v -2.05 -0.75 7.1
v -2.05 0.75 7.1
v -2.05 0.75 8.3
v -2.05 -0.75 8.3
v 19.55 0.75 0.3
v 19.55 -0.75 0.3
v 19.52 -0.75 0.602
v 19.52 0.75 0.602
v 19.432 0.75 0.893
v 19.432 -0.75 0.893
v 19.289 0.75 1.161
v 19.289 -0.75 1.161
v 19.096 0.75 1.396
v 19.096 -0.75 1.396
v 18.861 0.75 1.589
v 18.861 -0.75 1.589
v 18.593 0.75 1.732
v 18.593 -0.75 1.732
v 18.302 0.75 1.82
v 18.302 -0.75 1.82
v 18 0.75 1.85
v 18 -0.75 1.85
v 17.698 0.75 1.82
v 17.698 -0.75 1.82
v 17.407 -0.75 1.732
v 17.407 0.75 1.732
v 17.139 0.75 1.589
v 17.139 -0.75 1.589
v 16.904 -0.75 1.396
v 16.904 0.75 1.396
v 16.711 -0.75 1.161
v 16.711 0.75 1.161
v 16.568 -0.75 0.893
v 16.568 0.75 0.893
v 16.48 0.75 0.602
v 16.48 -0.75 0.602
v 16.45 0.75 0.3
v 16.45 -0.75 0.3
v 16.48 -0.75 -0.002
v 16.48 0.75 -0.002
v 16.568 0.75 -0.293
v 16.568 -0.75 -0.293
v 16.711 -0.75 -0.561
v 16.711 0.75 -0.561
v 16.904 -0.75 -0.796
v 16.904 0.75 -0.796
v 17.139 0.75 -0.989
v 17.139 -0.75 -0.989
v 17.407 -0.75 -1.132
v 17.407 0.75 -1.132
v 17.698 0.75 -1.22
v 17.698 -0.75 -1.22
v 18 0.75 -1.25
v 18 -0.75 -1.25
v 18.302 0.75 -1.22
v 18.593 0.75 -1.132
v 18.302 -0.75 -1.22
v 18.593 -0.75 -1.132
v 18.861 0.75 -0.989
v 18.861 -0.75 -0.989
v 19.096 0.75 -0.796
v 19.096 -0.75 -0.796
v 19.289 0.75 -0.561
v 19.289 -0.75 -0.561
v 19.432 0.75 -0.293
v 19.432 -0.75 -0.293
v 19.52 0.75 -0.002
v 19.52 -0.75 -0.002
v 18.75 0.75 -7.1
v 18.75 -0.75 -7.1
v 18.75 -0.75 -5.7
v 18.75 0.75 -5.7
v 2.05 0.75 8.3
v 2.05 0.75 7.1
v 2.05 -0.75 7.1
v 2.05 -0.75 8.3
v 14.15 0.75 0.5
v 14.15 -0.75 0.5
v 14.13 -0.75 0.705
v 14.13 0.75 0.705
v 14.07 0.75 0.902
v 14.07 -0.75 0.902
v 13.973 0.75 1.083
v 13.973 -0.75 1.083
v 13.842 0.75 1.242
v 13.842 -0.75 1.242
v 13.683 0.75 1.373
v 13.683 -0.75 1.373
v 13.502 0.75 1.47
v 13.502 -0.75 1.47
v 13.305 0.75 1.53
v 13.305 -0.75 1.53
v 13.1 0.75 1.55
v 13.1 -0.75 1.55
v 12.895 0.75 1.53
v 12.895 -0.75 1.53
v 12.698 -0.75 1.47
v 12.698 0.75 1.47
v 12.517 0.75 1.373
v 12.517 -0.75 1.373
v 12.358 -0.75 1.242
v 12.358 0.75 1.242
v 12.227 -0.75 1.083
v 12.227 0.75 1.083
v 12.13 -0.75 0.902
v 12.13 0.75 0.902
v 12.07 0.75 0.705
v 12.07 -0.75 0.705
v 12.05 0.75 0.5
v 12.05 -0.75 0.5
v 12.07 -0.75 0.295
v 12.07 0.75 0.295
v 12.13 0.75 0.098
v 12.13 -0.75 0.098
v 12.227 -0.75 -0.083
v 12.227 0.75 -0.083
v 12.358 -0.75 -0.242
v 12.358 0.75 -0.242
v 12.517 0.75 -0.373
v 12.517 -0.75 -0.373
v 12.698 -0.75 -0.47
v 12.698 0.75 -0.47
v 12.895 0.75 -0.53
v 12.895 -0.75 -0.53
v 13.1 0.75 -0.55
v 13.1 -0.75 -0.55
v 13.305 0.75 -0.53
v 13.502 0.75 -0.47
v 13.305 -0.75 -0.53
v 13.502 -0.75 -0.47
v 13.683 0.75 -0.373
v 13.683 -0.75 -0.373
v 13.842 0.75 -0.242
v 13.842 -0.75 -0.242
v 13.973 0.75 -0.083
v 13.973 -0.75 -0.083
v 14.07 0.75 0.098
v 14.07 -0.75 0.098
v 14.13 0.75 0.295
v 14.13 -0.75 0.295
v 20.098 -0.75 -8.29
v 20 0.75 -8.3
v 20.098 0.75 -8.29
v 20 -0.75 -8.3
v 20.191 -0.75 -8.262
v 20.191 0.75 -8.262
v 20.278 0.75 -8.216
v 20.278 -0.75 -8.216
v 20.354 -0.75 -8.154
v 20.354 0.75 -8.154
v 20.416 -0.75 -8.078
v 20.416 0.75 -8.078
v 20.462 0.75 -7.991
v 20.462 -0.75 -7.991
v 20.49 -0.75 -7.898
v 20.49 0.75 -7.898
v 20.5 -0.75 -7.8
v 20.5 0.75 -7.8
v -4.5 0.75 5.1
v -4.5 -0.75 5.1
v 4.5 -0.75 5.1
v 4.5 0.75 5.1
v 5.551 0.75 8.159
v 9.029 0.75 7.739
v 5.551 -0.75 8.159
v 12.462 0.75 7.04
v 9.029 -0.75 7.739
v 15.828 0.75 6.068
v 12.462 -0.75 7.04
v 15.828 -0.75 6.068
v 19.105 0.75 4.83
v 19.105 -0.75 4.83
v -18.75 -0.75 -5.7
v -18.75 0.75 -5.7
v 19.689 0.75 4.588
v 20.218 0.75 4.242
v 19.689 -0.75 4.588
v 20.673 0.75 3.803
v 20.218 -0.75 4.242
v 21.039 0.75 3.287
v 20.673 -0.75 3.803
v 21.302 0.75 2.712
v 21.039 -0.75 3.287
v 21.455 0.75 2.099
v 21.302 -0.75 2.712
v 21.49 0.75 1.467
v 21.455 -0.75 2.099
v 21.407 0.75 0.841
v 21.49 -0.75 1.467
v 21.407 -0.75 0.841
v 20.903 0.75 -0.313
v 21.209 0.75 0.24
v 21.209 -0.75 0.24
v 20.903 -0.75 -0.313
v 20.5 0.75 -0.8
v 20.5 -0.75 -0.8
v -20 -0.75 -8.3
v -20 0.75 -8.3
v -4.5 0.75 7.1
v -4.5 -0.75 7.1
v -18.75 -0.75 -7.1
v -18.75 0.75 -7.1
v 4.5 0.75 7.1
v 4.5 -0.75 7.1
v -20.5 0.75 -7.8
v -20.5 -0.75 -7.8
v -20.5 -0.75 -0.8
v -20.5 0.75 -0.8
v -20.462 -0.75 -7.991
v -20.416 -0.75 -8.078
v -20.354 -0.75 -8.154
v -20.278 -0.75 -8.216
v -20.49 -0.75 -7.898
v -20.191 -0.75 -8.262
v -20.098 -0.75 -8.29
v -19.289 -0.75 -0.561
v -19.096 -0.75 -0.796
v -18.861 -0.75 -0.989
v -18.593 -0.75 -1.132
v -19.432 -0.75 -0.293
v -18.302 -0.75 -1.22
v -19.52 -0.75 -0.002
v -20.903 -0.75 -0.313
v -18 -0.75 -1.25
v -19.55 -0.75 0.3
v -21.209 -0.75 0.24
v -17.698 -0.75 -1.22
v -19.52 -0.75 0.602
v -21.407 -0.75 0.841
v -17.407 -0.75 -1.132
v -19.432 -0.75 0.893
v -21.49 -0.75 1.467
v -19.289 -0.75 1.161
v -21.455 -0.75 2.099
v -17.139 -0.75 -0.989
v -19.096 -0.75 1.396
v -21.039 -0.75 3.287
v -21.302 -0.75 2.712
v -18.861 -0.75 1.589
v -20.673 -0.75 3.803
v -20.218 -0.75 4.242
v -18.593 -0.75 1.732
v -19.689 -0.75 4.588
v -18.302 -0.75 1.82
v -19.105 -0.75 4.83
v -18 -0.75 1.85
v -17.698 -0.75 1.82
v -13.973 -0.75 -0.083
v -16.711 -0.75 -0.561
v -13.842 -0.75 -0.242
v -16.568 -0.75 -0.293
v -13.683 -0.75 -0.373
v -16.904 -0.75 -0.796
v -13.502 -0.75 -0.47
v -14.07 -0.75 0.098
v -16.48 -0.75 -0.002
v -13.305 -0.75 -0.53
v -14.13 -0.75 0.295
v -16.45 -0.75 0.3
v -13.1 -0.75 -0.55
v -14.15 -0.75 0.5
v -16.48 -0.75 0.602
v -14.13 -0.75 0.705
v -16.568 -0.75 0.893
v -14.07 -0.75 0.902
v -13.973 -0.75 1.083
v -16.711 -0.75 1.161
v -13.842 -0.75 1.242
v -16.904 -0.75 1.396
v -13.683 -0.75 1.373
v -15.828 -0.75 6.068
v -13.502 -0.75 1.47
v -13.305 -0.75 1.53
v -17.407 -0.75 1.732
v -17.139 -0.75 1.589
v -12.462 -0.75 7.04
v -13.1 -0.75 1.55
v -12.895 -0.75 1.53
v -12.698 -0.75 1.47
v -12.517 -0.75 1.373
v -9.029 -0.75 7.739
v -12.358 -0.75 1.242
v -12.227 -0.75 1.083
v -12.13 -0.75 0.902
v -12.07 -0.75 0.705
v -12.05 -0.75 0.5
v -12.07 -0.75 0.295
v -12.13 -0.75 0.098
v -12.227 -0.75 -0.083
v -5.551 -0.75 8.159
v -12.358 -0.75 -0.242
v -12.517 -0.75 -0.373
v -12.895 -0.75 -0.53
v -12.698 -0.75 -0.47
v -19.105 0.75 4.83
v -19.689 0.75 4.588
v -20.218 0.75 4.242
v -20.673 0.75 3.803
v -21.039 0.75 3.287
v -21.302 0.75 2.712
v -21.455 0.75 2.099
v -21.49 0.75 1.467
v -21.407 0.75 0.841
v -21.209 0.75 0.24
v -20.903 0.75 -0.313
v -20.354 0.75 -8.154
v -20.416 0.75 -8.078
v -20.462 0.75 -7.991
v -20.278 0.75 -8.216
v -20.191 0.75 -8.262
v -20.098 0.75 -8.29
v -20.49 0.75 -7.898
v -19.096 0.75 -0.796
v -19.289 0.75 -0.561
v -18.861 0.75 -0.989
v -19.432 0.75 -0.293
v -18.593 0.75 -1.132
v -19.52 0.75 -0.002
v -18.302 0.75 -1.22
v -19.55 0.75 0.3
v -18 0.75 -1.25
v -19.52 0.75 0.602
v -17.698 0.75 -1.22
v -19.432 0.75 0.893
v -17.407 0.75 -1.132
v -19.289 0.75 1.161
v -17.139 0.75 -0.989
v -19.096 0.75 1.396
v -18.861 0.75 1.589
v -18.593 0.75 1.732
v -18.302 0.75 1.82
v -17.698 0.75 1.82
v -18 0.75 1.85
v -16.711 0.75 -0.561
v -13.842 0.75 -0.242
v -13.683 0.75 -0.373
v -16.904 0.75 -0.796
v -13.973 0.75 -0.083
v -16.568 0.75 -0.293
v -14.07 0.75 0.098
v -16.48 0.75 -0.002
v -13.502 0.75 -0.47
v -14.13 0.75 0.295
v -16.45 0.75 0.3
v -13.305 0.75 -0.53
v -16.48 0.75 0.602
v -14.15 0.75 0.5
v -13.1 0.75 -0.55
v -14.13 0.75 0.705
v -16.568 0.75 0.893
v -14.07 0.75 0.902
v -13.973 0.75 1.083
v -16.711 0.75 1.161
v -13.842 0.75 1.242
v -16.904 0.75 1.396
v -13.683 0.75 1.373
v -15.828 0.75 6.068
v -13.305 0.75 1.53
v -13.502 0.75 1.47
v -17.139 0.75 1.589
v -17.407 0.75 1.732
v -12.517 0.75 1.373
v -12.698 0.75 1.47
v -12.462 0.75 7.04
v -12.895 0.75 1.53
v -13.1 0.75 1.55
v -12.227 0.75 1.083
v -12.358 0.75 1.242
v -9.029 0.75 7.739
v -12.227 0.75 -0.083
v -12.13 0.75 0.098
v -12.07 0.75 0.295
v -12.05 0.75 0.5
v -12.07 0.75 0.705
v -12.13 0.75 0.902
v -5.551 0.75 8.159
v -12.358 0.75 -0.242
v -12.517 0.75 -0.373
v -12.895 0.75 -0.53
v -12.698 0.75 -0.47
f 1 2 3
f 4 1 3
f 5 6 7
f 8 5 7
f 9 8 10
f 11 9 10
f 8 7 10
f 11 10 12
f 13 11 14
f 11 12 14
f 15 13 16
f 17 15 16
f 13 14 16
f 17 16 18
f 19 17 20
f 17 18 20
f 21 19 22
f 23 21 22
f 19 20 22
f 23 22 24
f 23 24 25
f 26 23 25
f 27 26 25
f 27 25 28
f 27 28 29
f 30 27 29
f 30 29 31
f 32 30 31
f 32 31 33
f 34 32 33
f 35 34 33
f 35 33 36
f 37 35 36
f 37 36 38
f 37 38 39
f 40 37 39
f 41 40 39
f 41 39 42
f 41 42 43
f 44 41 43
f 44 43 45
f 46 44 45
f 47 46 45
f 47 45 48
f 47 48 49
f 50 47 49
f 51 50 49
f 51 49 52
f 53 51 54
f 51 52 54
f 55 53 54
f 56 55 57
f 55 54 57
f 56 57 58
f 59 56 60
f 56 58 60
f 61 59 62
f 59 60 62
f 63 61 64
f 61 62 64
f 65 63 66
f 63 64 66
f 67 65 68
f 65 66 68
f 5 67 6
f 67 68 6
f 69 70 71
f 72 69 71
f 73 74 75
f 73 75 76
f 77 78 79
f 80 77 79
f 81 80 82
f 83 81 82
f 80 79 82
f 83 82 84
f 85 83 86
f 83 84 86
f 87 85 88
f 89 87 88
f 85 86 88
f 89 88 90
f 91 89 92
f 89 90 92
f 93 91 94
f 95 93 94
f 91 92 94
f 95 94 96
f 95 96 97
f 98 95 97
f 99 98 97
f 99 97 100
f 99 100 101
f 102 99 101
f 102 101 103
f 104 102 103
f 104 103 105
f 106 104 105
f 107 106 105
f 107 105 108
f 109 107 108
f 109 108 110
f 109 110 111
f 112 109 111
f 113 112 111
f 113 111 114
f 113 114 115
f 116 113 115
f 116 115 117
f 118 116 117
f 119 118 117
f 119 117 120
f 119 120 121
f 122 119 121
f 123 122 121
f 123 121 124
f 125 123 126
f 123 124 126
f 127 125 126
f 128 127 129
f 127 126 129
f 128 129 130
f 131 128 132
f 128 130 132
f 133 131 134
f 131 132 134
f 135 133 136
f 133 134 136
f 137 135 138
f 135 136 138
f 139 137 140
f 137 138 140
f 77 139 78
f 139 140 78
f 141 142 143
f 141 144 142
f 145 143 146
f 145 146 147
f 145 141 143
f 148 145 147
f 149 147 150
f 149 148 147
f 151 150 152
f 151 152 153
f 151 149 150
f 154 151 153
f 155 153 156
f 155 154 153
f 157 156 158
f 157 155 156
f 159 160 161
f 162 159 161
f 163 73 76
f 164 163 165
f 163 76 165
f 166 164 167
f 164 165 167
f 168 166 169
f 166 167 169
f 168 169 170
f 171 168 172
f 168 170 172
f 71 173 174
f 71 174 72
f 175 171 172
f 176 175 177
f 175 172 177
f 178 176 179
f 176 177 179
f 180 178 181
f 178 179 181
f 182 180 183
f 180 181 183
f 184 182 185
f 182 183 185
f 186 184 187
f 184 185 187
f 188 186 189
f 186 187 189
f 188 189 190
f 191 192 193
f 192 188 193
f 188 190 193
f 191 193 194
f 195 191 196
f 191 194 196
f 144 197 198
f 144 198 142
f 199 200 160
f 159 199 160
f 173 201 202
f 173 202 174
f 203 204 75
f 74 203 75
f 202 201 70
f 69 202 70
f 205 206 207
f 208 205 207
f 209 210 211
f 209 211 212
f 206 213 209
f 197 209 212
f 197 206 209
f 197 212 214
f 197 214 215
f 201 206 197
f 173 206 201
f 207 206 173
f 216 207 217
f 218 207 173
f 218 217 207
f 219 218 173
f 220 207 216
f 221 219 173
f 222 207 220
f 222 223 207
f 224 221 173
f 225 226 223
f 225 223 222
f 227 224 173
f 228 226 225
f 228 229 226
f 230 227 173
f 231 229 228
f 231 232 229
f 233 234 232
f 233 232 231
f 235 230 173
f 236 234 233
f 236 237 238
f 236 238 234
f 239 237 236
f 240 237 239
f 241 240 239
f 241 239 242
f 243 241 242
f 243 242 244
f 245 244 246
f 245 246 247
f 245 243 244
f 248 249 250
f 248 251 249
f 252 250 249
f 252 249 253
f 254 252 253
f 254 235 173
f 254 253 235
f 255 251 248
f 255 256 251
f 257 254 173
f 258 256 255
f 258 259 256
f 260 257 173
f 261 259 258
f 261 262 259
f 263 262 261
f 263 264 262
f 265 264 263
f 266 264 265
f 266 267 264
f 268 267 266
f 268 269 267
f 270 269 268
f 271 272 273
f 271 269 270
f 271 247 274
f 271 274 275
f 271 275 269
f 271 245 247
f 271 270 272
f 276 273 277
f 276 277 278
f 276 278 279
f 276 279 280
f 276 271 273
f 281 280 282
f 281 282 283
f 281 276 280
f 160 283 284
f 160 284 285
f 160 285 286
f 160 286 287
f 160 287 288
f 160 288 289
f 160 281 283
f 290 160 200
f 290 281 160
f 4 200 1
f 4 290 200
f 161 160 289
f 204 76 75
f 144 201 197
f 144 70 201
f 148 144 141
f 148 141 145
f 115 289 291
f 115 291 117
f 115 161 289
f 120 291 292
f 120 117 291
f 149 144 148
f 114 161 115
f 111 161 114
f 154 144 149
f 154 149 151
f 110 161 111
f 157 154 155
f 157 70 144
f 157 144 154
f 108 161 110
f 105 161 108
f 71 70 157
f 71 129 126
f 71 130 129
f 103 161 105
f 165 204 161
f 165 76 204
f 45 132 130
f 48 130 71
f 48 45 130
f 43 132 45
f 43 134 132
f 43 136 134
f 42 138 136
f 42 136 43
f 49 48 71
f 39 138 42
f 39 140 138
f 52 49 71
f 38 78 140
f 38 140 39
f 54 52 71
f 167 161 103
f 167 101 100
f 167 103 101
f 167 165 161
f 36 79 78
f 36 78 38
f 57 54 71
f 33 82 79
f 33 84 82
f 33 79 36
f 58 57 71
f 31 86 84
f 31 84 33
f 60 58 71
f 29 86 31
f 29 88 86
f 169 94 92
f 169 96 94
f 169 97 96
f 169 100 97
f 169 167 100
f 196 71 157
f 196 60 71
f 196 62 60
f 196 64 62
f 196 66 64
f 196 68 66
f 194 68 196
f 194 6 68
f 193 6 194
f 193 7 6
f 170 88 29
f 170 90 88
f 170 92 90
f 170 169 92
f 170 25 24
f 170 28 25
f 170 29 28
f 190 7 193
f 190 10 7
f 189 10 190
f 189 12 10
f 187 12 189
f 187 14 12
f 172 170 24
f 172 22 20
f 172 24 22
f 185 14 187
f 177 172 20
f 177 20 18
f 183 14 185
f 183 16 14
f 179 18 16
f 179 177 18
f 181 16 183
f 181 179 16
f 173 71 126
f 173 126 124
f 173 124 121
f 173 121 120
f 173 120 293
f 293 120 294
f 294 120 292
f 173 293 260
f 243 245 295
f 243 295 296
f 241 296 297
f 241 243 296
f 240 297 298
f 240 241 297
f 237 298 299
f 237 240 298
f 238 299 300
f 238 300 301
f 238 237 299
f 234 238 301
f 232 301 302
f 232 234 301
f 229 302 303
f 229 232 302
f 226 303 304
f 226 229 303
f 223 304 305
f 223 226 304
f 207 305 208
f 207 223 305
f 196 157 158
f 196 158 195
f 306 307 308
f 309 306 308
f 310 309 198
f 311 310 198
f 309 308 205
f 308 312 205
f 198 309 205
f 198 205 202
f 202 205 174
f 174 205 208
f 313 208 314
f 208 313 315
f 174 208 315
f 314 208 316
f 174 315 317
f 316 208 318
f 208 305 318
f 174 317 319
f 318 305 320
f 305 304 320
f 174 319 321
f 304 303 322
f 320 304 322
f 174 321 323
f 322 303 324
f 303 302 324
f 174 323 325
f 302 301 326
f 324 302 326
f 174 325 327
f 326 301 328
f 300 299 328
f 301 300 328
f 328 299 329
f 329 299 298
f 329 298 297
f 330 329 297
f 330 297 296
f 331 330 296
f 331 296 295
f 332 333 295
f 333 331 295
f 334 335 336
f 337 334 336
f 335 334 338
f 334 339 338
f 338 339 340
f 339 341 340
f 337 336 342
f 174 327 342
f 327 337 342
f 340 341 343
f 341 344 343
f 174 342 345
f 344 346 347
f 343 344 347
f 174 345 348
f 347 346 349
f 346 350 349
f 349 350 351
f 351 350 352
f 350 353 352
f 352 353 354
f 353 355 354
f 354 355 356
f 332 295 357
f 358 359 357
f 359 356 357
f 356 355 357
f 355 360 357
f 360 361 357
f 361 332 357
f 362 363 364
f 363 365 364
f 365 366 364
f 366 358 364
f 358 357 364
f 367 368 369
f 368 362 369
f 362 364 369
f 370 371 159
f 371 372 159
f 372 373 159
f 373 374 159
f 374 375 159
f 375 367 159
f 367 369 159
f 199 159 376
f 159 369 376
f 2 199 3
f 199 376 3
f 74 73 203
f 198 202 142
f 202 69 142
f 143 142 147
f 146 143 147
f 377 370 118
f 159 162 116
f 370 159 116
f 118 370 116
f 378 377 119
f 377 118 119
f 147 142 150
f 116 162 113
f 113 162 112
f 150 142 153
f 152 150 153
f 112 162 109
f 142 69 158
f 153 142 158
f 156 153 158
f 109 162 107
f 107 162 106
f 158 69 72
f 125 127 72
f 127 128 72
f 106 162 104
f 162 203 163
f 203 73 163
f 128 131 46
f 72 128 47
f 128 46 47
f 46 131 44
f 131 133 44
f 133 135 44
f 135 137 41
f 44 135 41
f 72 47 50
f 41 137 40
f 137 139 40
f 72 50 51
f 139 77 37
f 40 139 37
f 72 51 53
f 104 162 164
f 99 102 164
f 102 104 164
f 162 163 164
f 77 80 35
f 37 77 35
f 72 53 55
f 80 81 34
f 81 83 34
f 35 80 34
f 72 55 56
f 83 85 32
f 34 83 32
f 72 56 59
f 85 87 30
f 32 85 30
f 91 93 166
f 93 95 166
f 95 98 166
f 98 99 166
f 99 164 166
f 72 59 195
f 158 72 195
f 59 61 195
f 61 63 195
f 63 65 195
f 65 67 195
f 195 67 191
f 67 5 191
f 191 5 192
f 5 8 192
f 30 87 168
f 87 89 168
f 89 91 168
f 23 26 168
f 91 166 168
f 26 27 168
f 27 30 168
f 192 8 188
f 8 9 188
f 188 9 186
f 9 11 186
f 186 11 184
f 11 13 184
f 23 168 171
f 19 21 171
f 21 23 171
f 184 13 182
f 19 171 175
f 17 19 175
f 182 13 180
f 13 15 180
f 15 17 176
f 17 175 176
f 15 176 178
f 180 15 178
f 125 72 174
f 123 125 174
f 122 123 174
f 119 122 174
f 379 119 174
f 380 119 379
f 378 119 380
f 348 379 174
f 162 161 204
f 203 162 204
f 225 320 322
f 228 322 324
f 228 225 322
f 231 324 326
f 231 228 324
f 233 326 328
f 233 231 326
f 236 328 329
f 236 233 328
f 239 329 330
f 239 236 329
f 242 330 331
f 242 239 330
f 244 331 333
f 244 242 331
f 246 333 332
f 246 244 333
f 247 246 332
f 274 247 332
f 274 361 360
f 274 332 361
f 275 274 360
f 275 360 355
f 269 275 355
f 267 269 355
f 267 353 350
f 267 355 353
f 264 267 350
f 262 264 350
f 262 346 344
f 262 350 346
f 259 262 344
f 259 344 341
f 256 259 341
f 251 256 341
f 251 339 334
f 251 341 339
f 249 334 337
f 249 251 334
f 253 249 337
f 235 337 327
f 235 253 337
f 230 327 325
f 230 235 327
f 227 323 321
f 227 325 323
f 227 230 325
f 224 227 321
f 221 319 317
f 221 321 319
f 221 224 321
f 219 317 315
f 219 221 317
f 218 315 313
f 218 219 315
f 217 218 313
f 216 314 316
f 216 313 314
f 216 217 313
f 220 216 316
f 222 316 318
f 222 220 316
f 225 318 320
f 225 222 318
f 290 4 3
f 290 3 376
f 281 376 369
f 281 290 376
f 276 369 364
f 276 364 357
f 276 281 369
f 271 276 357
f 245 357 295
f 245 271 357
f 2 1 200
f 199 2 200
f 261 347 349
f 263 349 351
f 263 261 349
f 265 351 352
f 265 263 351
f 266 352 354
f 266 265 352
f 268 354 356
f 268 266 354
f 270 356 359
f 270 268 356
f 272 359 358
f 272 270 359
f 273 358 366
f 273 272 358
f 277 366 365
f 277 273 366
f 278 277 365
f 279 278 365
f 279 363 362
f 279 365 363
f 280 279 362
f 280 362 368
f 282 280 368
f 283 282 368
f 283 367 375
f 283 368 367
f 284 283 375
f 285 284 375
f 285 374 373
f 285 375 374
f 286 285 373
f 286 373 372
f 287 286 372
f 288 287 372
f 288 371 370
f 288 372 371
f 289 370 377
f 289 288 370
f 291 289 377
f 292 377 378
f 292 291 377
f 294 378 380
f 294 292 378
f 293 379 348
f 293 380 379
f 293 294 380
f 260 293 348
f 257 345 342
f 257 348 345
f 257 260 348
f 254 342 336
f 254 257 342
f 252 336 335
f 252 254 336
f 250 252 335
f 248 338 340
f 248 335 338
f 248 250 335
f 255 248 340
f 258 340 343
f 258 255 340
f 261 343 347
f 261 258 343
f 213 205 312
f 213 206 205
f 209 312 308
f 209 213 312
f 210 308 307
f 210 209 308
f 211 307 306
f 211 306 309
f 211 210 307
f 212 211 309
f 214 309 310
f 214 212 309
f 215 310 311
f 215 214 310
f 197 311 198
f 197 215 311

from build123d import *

# Parameters (mm, degrees)
F0_W      = 43
F0_H      = 16.6
F1_DEPTH  = 0.75
F2_W      = 37.5
F2_H      = 1.4
F3_DEPTH  = 75
F5_R      = 1.05
F5_R_2    = 1.55
F6_DEPTH  = 1.501
F7_W      = 4.1
F7_H      = 1.9489285067
F7_H_2    = 0.8016004696
F7_W_2    = 2
F7_H_3    = 15
F8_DEPTH  = 1.501
F10_DEPTH = 1.501
F11_R     = 0.5


# Not quite as in the source:
# - a feature of the source that left no trace in its solid (it failed there, or was rolled back) is left out
# - a pattern or mirror of a feature is missing from the dataset's text; its kind, count and spacing are read off the source's solid


with BuildPart() as f1:
    # F0 (on Front) → F1 (new body, symmetric)
    with BuildSketch(Plane.XZ):
        Rectangle(F0_W, F0_H)
    extrude(amount=F1_DEPTH, both=True)

    # F2 (on Front) → F3 (cut, symmetric)
    with BuildSketch(Plane.XZ):
        with Locations((0, -6.4)):
            Rectangle(F2_W, F2_H)
    extrude(amount=F3_DEPTH, both=True, mode=Mode.SUBTRACT)

    # F5 (on face) → F6 (cut, through all)
    with BuildSketch(Plane.XZ.offset(0.75)):
        with Locations((13.1, 0.5)):
            Circle(F5_R)
        with Locations((18, 0.3)):
            Circle(F5_R_2)
    f6 = extrude(amount=-F6_DEPTH, mode=Mode.SUBTRACT)

    # F6_copies: F6 across plane
    add(f6.mirror(Plane(origin=(0, 0, 0), x_dir=(0, 0, -1), z_dir=(-1, 0, 0))), mode=Mode.SUBTRACT)

    # F7 (on face) → F8 (cut, through all)
    with BuildSketch(Plane.XZ.offset(0.75)):
        Polygon((-2.05, 7.1), (-4.5, 7.1), (-4.5, 5.1), (4.5, 5.1), (4.5, 7.1), (2.05, 7.1), (2.05, 6.2983995304), (-2.05, 6.2983995304), align=None)
        with Locations((0, 8.0744642533)):
            Rectangle(F7_W, F7_H)
        with Locations((0, 6.6991997652)):
            Rectangle(F7_W, F7_H_2)
        with Locations((21.5, -8.3)):
            Rectangle(F7_W_2, F7_H_3)
    f8 = extrude(amount=-F8_DEPTH, mode=Mode.SUBTRACT)

    # F8_copies: F8 across plane
    add(f8.mirror(Plane(origin=(0, 0, 0), x_dir=(0, 0, -1), z_dir=(-1, 0, 0))), mode=Mode.SUBTRACT)

    # F9 (on face) → F10 (cut, through all)
    with BuildSketch(Plane.XZ.offset(0.75)):
        with BuildLine():
            ThreePointArc((2.05, 8.3), (10.75214793, 7.4237307967), (19.104892388, 4.8301066272))
            ThreePointArc((19.104892388, 4.8301066272), (21.392838702, 2.4091433089), (20.5, -0.8))
            Line((20.5, -0.8), (29.8848059028, -7.0995693095))
            Line((29.8848059028, -7.0995693095), (22.5688572973, 15.8109050244))
            Line((22.5688572973, 15.8109050244), (2.05, 8.3))
        make_face()
    f10 = extrude(amount=-F10_DEPTH, mode=Mode.SUBTRACT)

    # F10_copies: F10 across plane
    add(f10.mirror(Plane(origin=(0, 0, 0), x_dir=(0, 0, -1), z_dir=(-1, 0, 0))), mode=Mode.SUBTRACT)

    # F11
    f11_edges = [f1.edges().sort_by_distance(p)[0] for p in [
        (20.5, 0, -8.3),
        (-20.5, 0, -8.3),
    ]]
    fillet(f11_edges, radius=F11_R)


solid = f1.part
